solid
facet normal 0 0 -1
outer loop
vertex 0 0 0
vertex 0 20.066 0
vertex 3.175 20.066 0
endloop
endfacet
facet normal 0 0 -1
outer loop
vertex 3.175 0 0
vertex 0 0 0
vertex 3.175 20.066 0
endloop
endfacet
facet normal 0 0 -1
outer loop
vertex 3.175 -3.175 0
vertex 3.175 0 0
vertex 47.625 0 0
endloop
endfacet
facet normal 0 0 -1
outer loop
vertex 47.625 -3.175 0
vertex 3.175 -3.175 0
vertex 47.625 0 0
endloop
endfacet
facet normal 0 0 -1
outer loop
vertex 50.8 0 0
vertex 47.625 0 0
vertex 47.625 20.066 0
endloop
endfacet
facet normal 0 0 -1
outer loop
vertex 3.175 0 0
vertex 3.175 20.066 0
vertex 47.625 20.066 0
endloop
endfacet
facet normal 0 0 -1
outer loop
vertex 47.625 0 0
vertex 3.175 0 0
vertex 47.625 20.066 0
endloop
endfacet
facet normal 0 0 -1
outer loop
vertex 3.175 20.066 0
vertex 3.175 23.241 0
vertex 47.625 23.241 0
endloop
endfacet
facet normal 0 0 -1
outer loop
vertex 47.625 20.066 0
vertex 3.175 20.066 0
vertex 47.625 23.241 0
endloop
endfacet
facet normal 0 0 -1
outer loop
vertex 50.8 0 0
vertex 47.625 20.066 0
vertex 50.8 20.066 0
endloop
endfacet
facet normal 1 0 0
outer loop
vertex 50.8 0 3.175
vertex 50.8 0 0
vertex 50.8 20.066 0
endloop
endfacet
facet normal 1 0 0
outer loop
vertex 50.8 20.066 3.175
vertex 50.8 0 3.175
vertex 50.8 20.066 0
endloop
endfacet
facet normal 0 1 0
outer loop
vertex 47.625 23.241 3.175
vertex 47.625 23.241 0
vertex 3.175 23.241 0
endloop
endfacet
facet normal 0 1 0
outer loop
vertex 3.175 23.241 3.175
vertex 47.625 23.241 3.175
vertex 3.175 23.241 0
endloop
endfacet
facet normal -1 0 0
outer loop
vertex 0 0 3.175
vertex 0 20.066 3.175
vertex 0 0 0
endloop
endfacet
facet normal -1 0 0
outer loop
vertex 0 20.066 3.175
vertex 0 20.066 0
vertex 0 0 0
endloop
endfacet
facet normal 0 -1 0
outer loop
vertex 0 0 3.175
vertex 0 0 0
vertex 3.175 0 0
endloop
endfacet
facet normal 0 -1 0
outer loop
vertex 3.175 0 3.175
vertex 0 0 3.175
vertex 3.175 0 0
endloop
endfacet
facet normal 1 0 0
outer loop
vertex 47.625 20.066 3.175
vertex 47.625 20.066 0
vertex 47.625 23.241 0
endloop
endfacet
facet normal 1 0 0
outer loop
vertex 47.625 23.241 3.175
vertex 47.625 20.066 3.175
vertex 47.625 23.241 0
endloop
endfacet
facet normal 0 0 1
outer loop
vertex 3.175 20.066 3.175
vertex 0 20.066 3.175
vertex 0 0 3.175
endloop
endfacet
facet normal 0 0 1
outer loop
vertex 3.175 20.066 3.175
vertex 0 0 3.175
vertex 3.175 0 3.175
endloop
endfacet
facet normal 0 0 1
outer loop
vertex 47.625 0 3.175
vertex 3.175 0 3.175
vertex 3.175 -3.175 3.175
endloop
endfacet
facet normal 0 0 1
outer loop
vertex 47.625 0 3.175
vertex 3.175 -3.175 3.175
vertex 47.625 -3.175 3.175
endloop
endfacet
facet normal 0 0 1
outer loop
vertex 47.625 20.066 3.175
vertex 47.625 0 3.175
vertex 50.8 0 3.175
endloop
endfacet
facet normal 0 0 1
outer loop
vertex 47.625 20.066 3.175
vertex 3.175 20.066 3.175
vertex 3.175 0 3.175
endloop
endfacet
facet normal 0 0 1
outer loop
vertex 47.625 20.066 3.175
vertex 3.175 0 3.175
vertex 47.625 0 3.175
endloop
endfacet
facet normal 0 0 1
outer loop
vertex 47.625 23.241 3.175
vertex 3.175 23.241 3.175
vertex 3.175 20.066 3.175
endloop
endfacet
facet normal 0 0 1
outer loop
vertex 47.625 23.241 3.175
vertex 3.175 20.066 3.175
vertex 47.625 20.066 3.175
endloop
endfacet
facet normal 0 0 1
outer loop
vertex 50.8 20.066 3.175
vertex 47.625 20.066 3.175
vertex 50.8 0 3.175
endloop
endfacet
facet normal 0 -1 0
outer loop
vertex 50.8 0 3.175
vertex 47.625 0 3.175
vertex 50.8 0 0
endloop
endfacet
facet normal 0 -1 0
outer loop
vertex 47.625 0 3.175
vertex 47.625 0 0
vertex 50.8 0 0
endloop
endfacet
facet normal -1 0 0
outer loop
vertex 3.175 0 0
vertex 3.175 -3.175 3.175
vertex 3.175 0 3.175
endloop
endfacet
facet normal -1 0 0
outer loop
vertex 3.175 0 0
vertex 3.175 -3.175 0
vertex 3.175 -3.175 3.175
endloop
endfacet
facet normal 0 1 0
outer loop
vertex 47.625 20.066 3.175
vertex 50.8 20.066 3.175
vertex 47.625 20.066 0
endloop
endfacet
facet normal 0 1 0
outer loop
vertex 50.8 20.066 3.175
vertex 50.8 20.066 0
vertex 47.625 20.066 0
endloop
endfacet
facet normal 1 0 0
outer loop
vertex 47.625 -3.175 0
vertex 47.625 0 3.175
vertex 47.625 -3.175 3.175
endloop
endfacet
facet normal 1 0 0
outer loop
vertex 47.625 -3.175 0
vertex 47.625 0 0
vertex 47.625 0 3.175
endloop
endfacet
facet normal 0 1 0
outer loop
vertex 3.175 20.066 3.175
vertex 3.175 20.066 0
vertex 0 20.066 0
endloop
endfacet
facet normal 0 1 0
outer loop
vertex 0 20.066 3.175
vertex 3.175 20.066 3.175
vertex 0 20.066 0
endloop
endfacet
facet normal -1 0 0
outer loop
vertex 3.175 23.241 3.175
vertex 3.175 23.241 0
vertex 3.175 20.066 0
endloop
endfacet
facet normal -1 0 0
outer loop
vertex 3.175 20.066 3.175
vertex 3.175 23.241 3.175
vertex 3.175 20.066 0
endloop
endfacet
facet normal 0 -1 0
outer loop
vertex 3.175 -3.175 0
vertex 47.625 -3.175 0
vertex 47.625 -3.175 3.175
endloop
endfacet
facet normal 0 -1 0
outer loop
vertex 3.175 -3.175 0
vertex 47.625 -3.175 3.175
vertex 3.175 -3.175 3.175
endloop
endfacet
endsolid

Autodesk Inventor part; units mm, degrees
ref_plane "YZ Plane" through (0, 0, 0) normal (1, 0, 0) x (0, 1, 0)
ref_plane "XZ Plane" through (0, 0, 0) normal (0, 1, 0) x (-1, 0, 0)
ref_plane "XY Plane" through (0, 0, 0) normal (0, 0, 1) x (1, 0, 0)
sketch "Sketch1" plane through (0, 0, 0) normal (0, 0, 1) x (1, 0, 0)
  line L0 (0, 0) -> (50.8, 0)
  line L1 (50.8, 0) -> (50.8, 20.066)
  line L2 (50.8, 20.066) -> (0, 20.066)
  line L3 (0, 20.066) -> (0, 0)
  line L4 (3.175, 20.066) -> (47.625, 20.066)
  line L5 (47.625, 20.066) -> (47.625, 23.241)
  line L6 (47.625, 23.241) -> (3.175, 23.241)
  line L7 (3.175, 23.241) -> (3.175, 20.066)
  line L8 (3.175, 0) -> (47.625, 0)
  line L9 (47.625, 0) -> (47.625, -3.175)
  line L10 (47.625, -3.175) -> (3.175, -3.175)
  line L11 (3.175, -3.175) -> (3.175, 0)
  point P0 (47.625, -1.5875)
  dimension "d0" = 3.175
  dimension "d1" = 3.175
  dimension "d2" = 3.175
  dimension "d3" = 3.175
  dimension "d4" = 3.175
  dimension "d5" = 3.175
  dimension "d6" = 44.45
  dimension "d7" = 20.066
extrude "Extrusion1" add sketch "Sketch1" along normal blind 3.175
properties part number "front support"
